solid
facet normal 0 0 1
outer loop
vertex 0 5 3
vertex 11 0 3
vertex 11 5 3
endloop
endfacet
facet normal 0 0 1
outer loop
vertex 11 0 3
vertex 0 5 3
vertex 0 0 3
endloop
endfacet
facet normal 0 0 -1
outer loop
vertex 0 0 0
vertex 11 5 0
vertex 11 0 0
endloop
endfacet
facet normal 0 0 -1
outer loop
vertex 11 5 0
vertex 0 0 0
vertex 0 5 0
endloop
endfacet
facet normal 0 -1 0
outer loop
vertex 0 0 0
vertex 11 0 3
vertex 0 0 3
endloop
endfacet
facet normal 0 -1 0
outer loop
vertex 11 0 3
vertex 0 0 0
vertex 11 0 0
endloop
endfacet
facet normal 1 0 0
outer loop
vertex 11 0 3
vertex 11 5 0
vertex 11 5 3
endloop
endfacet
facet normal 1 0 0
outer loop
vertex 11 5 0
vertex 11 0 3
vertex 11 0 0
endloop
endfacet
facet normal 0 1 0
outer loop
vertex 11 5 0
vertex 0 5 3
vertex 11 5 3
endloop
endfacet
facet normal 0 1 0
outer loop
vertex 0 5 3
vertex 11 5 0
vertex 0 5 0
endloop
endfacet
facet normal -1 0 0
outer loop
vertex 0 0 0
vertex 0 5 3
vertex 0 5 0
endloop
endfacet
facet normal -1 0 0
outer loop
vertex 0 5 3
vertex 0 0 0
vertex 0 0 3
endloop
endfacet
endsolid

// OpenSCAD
// Generated by SolidPython 1.0.1 on 2020-07-29 00:46:55


cube(size = [11, 5, 3]);
/***********************************************
*********      SolidPython code:      **********
************************************************
 
# import packages: SolidPython
from solid import *
from solid.utils import *
from itertools import chain, combinations, permutations


class Resize:

    def __init__(self, scad_file):
        self.scad_file = scad_file
        #self.scad_file = import_scad(scad_file)
        # cone/cylinder param:
        self.r1 = 0
        self.r2 = 0
        self.h = 0
        # rectangular prism param:
        self.w = 0
        self.l = 0
        # ellipse param:
        self.r = 0

    # import OpenScad code (file name corresponds to shape)


    # classify shape + parameters
    def assign(self, param1, param2, param3):
        if self.scad_file == 'cone.scad':
            self.r1 = param1
            self.r2 = param2
            self.h = param3
        elif self.scad_file == 'cylinder.scad':
            self.r1 = param1
            self.r2 = param2
            self.h = param3
        elif self.scad_file == 'rectangularPrism.scad':
            self.h = param1
            self.l = param2
            self.w = param3
        else:
            self.r = param1
            self.h = param2

    # resize parameters
    def iterate(self):
        x = range(3, 20, 2)
        i = 1
        if self.scad_file == 'cone.scad':
            tempList = list(permutations(x, 2))
            for temp in tempList:
                param1 = temp[0]
                param2 = temp[1]
                filepath = 'produced_scad_files/' + 'cone' + str(param1) + '_' + str(param2) + '_' + '.scad'
                scad_render_to_file(cylinder(h=param1, r1=param2, r2=0), filepath)

        elif self.scad_file == 'cylinder.scad':
            tempList = list(permutations(x, 3))
            for temp in tempList:
                param1 = temp[0]
                param2 = temp[1]
                filepath = 'produced_scad_files/' + 'cylinder' + str(param1) + '_' + str(param2) + '_' + '.scad'
                scad_render_to_file(cylinder(h=param1, r1=param2, r2=param2), filepath)

        elif self.scad_file == 'rectangularPrism.scad':
            tempList = list(permutations(x, 3))
            for temp in tempList:
                param1 = temp[0]
                param2 = temp[1]
                param3 = temp[2]
                filepath = 'produced_scad_files/' + 'rectangularPrism' + str(param1) + '_' + str(param2) + '_' + str(
                    param3) + '.scad'
                scad_render_to_file(cube(size=(param1, param2, param3)), filepath)

        elif self.scad_file == 'ellipse.scad':
            tempList = list(permutations(x, 4))
            for temp in tempList:
                param1 = temp[0]
                param2 = temp[1]
                param3 = temp[2]
                param4 = temp[3]
                filepath = 'produced_scad_files/' + 'ellipse' + str(param1) + '_' + str(param2) + '_' + str(param3) + '_' + str(param4) + '.scad'
                scad_render_to_file(scale([param1, param2, param3])(sphere(r=param4)), filepath)

    def render_to_scadfile(self):
        scad_render_to_file(scad, 'example.scad') 
 
************************************************/
